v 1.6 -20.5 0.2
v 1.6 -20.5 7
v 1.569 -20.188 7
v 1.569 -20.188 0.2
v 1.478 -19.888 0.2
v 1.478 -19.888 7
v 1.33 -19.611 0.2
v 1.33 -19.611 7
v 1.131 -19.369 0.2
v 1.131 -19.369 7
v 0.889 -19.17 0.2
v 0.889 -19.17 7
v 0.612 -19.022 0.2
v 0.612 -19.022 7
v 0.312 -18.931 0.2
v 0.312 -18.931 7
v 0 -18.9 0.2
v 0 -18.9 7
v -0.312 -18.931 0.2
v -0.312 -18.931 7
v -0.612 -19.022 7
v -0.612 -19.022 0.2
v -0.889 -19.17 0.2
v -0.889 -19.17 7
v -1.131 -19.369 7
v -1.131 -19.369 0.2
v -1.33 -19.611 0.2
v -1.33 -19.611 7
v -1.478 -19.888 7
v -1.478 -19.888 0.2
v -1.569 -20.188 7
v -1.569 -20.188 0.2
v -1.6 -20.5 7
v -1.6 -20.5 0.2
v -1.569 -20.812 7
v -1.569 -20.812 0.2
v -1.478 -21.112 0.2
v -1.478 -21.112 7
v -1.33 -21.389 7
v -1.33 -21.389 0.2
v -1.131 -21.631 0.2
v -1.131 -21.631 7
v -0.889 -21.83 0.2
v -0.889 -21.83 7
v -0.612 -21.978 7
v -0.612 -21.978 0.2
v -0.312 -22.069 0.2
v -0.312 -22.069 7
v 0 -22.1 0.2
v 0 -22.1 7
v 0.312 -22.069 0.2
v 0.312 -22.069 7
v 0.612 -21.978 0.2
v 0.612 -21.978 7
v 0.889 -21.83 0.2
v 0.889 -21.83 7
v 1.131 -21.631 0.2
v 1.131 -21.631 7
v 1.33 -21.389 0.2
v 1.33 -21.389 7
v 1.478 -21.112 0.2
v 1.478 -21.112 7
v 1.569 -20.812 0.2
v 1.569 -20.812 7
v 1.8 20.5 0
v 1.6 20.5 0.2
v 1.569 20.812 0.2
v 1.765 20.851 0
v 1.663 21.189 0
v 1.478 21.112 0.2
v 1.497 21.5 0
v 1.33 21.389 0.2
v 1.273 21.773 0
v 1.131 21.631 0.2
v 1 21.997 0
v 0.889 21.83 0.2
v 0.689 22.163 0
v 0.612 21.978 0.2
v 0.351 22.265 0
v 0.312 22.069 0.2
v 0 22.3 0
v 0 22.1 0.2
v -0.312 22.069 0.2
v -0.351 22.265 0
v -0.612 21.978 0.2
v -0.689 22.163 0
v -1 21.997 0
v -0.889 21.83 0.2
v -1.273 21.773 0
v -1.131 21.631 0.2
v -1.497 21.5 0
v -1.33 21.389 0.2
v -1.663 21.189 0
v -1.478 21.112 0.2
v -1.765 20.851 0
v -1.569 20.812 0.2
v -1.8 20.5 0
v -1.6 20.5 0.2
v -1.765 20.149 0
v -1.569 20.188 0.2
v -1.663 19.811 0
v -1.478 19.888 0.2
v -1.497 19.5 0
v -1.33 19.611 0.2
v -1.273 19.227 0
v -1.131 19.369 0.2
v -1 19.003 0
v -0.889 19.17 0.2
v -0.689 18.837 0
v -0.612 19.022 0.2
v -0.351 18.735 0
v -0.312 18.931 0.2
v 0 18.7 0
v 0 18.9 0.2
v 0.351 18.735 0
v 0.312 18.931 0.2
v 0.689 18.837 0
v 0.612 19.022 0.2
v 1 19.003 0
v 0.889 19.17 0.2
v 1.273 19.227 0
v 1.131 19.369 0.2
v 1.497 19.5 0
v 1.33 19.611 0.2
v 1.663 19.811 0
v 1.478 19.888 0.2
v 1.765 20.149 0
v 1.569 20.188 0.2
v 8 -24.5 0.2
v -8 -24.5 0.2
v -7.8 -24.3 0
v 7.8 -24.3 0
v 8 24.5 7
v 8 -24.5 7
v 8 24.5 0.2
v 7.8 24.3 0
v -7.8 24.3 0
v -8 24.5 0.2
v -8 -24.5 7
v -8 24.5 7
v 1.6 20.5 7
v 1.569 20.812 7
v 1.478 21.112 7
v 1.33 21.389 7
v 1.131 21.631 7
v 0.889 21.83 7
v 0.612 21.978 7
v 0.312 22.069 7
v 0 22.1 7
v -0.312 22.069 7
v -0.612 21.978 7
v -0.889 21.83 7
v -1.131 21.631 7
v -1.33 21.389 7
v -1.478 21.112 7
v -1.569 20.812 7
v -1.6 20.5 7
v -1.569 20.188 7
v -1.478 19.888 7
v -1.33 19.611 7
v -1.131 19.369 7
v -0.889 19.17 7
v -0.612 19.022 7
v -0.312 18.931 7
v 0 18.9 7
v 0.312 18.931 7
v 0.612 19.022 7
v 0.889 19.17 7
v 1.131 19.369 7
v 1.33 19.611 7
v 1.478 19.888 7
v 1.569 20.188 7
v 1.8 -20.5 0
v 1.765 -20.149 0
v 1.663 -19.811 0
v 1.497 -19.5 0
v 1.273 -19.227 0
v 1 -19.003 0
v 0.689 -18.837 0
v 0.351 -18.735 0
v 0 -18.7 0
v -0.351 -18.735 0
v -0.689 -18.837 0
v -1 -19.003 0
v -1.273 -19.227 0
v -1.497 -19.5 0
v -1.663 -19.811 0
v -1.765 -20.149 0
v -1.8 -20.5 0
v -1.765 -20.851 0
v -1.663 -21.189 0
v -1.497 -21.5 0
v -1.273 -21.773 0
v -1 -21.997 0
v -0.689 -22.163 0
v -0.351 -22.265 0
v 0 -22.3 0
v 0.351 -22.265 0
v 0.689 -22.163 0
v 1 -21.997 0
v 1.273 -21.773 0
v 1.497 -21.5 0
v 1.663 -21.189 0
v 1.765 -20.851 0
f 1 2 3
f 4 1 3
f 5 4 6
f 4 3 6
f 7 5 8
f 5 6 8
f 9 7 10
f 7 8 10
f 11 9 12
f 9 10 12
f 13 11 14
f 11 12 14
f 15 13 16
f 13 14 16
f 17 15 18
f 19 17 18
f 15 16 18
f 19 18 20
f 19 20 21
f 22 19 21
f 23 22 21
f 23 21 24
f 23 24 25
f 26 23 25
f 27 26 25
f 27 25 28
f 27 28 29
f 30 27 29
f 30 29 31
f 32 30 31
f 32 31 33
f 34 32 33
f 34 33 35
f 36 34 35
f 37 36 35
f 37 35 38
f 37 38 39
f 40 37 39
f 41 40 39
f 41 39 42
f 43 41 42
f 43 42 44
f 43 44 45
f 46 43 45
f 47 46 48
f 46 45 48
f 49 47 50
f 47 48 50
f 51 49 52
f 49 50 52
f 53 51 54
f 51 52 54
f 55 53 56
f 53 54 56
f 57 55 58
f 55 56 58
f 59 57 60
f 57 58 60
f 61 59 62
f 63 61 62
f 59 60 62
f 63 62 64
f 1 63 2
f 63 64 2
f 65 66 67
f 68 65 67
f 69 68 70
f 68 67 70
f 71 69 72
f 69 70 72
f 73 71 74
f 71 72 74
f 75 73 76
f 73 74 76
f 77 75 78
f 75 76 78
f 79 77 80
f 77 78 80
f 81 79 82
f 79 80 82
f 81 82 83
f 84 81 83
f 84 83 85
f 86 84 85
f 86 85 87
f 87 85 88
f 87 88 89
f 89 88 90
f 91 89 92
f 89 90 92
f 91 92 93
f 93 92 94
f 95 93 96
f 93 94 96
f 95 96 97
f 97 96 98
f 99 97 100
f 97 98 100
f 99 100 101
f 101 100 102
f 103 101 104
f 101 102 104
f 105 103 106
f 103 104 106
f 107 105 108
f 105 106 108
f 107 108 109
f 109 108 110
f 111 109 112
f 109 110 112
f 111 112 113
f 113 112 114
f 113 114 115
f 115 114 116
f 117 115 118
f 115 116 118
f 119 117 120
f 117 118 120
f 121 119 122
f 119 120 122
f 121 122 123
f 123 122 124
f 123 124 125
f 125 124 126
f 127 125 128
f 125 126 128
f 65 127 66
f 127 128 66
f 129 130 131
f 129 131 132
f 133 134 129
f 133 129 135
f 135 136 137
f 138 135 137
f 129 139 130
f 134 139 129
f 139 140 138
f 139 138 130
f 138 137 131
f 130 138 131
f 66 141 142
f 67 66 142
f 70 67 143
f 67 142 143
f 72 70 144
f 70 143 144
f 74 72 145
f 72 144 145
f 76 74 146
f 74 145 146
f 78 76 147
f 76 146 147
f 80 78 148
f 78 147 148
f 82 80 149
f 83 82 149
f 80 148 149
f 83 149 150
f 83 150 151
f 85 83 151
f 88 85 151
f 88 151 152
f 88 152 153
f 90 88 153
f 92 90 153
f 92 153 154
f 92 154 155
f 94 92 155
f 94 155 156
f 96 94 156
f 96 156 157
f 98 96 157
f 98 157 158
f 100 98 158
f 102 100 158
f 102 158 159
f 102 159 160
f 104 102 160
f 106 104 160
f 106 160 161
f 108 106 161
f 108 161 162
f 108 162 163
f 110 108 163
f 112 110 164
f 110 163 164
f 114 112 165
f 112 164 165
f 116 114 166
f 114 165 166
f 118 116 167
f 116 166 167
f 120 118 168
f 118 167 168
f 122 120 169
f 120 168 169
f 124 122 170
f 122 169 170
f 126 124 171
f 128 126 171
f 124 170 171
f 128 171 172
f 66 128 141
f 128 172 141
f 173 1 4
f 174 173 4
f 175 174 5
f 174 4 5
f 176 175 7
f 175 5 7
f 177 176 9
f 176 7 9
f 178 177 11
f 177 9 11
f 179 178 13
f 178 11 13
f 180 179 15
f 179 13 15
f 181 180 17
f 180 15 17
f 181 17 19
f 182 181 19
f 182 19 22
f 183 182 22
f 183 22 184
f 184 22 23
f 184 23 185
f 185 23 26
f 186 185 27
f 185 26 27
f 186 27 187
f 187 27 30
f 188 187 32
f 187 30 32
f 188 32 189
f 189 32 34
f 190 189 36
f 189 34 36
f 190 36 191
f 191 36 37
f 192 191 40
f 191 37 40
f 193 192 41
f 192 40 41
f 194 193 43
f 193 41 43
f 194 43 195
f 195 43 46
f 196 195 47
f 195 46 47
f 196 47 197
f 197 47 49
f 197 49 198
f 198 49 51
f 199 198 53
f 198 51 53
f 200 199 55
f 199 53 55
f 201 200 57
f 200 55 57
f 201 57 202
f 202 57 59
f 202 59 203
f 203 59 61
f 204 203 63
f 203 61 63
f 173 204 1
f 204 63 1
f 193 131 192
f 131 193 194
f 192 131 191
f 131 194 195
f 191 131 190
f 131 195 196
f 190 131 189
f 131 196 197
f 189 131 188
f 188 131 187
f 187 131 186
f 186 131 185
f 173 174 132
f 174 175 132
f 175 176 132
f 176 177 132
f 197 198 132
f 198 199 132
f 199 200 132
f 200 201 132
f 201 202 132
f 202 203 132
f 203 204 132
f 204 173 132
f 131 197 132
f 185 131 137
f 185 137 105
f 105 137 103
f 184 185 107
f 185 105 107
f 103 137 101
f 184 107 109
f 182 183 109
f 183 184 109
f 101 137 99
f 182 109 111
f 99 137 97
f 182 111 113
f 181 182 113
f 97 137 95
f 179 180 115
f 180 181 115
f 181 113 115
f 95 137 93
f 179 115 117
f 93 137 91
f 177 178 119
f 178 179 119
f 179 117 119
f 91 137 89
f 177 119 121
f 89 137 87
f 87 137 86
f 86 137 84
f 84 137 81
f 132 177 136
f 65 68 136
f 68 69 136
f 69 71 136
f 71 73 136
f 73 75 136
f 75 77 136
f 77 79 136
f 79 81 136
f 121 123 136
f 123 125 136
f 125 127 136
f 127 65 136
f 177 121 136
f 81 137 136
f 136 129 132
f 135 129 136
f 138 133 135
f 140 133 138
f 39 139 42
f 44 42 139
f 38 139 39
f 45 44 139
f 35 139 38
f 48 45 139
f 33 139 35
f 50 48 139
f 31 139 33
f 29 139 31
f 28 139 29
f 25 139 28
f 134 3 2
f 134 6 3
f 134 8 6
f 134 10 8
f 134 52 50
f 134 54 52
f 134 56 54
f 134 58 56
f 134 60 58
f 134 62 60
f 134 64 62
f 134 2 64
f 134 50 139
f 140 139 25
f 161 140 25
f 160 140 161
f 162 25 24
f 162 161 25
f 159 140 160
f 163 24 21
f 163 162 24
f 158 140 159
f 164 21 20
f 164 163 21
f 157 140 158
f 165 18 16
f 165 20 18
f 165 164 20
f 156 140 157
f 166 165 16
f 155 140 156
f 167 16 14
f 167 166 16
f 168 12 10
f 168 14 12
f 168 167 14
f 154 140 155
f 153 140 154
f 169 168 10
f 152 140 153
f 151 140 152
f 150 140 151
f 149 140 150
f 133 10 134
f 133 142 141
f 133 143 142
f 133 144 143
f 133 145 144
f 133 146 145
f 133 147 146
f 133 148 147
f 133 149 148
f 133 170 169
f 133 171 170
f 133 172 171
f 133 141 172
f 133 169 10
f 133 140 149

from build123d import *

# Parameters (mm, degrees)
F0_W    = 16
F0_H    = 49
F0_R    = 1.6
F3_SIZE = 0.2


with BuildPart() as f2:
    # F2: sweep along a path in F1
    with BuildLine(Plane.XZ) as f2_path:
        Line((0, 0), (0, 7))
    # F0 (on Top) → F2 (sweep)
    with BuildSketch(Plane.XY):
        Rectangle(F0_W, F0_H)
        with Locations((0, -20.5)):
            Circle(F0_R, mode=Mode.SUBTRACT)
        with Locations((0, 20.5)):
            Circle(F0_R, mode=Mode.SUBTRACT)
    sweep(path=f2_path.line)

    # F3
    f3_edges = [f2.edges().sort_by_distance(p)[0] for p in [
        (8, 0, 0),
        (0, -24.5, 0),
        (0, 24.5, 0),
        (-8, 0, 0),
        (-1.6, -20.5, 0),
        (-1.6, 20.5, 0),
    ]]
    chamfer(f3_edges, length=F3_SIZE)


solid = f2.part
